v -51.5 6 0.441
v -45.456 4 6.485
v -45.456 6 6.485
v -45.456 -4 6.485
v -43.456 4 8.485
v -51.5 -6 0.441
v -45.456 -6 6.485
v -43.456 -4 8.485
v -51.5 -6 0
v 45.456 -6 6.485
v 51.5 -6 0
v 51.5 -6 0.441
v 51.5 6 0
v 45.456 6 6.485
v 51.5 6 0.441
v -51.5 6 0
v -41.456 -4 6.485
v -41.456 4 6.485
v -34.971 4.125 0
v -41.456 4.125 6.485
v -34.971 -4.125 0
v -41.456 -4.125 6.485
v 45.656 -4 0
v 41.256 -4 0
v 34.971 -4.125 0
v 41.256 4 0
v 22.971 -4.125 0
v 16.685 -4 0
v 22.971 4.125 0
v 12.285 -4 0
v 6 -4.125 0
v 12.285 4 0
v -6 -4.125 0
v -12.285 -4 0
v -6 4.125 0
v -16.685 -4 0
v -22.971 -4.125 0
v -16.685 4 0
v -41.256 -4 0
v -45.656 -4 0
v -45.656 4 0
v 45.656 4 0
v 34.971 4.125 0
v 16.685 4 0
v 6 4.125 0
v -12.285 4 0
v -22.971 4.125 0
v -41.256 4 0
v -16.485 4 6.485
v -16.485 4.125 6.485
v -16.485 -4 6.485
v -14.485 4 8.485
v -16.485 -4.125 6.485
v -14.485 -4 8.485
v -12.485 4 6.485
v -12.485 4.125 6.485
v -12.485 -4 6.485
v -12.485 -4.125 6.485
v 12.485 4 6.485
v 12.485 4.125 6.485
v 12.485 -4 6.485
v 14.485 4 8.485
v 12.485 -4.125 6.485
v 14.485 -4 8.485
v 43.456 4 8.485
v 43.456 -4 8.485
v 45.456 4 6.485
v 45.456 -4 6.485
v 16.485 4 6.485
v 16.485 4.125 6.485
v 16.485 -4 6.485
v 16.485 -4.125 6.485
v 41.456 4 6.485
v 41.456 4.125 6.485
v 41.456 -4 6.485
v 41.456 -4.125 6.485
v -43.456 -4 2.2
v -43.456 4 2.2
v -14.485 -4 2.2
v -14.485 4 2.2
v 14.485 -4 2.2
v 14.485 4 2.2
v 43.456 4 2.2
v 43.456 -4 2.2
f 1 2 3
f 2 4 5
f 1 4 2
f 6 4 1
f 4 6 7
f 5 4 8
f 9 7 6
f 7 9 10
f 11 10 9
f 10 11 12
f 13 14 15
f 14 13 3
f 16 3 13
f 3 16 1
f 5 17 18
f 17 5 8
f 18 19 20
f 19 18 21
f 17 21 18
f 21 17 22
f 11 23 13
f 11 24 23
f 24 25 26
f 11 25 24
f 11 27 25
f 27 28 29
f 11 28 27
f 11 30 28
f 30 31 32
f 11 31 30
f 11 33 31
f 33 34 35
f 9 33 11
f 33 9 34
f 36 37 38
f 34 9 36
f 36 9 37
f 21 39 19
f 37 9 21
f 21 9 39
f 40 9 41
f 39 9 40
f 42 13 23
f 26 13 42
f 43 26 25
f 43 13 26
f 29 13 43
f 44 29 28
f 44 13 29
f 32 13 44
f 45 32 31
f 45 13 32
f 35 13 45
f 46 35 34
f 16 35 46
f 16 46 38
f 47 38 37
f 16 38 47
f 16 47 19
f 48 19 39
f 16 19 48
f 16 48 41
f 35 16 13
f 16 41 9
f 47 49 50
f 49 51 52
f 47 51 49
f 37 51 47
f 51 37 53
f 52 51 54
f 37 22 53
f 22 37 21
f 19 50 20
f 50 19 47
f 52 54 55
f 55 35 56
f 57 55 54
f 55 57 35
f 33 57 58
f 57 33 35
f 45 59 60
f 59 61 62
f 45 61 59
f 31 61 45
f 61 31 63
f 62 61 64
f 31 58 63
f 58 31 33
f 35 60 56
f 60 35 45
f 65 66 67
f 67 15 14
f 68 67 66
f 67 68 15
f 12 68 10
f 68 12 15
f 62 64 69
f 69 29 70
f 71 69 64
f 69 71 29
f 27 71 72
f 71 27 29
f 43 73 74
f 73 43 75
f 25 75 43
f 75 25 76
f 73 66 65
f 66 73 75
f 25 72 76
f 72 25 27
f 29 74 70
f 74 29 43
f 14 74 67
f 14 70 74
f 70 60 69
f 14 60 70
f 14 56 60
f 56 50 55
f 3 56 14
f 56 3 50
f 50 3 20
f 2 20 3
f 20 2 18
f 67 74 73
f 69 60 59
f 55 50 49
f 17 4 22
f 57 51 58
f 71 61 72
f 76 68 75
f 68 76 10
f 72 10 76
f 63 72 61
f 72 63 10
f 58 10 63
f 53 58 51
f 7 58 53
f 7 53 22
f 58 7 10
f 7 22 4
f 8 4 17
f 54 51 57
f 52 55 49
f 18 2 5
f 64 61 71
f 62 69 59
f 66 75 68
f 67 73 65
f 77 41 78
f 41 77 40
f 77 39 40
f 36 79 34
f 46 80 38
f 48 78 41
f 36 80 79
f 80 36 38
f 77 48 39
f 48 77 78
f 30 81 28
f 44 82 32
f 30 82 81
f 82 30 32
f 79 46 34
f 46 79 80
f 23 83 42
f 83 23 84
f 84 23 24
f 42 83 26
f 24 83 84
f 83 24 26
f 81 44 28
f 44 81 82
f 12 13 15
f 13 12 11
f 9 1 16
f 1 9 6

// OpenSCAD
/*
 * Copyright 2015 Bryan Matsuo
 *
 * This work is licensed for use by others under Creative Commons (BY-SA).
 * */
CoinSide=12;

intersection() {
    player_coins(side=CoinSide, t=2);
    cube(size=103, center=true);
}

module player_coins(side=CoinSide, stack=4, nstack=3, t=1) {
    r = (side/2)/sin(22.5);
    w = 2*(r*cos(22.5));
    translate([-(nstack/2-0.5)*(side + 2*side*cos(45)), 0, 0])
    difference() {
        union() {
            difference() {
                _player_coins(side=side, wcoin=w, stack=stack, t=t, nstack=3);

                translate([-100, -100, side*cos(45)-2])
                cube(size=[200, 200, 200]);
            }

            _player_coins(side=side, wcoin=w, stack=stack, t=0, nstack=3);
        }
        translate([0, 0, -side*cos(45)+2.2])
        _player_coins(side=side, wcoin=w, stack=stack, t=0, nstack=3, fudge=0.3);
    }
}

module _player_coins(side=CoinSide, wcoin=26, stack=4, nstack=3, t=1, fudge=0.125) {
    stack_size = stack * 2;
    r = (wcoin/2)/sin(22.5);
    for (i = [0:nstack-1]) {
        translate([i * (side + 2*side*cos(45)), 0, 0])
        difference() {
            translate([0, 0, -r*sin(22.5) - side])
            rotate([90, 0, 0])
            translate([0, 0, -(stack_size+2*t)/2])
            rotate([0, 0, 22.5])
            cylinder(r=r, h=stack_size+2*t, $fn=8);

            translate([0, (stack_size+2*fudge)/2, wcoin/2])
            rotate([90, 0, 0])
            coin(w=wcoin, t=stack_size+2*fudge);

            cube(size=[side, stack_size+fudge, 100], center=true);

            translate([0, 0, -100])
            cube(size=200, center=true);
        }
    }
}

module coin(w=26, t=2) {
    r = (w/2)/cos(22.5);
    rotate([0, 0, 22.5])
    cylinder(r=r, h=t, $fn=8);
}
